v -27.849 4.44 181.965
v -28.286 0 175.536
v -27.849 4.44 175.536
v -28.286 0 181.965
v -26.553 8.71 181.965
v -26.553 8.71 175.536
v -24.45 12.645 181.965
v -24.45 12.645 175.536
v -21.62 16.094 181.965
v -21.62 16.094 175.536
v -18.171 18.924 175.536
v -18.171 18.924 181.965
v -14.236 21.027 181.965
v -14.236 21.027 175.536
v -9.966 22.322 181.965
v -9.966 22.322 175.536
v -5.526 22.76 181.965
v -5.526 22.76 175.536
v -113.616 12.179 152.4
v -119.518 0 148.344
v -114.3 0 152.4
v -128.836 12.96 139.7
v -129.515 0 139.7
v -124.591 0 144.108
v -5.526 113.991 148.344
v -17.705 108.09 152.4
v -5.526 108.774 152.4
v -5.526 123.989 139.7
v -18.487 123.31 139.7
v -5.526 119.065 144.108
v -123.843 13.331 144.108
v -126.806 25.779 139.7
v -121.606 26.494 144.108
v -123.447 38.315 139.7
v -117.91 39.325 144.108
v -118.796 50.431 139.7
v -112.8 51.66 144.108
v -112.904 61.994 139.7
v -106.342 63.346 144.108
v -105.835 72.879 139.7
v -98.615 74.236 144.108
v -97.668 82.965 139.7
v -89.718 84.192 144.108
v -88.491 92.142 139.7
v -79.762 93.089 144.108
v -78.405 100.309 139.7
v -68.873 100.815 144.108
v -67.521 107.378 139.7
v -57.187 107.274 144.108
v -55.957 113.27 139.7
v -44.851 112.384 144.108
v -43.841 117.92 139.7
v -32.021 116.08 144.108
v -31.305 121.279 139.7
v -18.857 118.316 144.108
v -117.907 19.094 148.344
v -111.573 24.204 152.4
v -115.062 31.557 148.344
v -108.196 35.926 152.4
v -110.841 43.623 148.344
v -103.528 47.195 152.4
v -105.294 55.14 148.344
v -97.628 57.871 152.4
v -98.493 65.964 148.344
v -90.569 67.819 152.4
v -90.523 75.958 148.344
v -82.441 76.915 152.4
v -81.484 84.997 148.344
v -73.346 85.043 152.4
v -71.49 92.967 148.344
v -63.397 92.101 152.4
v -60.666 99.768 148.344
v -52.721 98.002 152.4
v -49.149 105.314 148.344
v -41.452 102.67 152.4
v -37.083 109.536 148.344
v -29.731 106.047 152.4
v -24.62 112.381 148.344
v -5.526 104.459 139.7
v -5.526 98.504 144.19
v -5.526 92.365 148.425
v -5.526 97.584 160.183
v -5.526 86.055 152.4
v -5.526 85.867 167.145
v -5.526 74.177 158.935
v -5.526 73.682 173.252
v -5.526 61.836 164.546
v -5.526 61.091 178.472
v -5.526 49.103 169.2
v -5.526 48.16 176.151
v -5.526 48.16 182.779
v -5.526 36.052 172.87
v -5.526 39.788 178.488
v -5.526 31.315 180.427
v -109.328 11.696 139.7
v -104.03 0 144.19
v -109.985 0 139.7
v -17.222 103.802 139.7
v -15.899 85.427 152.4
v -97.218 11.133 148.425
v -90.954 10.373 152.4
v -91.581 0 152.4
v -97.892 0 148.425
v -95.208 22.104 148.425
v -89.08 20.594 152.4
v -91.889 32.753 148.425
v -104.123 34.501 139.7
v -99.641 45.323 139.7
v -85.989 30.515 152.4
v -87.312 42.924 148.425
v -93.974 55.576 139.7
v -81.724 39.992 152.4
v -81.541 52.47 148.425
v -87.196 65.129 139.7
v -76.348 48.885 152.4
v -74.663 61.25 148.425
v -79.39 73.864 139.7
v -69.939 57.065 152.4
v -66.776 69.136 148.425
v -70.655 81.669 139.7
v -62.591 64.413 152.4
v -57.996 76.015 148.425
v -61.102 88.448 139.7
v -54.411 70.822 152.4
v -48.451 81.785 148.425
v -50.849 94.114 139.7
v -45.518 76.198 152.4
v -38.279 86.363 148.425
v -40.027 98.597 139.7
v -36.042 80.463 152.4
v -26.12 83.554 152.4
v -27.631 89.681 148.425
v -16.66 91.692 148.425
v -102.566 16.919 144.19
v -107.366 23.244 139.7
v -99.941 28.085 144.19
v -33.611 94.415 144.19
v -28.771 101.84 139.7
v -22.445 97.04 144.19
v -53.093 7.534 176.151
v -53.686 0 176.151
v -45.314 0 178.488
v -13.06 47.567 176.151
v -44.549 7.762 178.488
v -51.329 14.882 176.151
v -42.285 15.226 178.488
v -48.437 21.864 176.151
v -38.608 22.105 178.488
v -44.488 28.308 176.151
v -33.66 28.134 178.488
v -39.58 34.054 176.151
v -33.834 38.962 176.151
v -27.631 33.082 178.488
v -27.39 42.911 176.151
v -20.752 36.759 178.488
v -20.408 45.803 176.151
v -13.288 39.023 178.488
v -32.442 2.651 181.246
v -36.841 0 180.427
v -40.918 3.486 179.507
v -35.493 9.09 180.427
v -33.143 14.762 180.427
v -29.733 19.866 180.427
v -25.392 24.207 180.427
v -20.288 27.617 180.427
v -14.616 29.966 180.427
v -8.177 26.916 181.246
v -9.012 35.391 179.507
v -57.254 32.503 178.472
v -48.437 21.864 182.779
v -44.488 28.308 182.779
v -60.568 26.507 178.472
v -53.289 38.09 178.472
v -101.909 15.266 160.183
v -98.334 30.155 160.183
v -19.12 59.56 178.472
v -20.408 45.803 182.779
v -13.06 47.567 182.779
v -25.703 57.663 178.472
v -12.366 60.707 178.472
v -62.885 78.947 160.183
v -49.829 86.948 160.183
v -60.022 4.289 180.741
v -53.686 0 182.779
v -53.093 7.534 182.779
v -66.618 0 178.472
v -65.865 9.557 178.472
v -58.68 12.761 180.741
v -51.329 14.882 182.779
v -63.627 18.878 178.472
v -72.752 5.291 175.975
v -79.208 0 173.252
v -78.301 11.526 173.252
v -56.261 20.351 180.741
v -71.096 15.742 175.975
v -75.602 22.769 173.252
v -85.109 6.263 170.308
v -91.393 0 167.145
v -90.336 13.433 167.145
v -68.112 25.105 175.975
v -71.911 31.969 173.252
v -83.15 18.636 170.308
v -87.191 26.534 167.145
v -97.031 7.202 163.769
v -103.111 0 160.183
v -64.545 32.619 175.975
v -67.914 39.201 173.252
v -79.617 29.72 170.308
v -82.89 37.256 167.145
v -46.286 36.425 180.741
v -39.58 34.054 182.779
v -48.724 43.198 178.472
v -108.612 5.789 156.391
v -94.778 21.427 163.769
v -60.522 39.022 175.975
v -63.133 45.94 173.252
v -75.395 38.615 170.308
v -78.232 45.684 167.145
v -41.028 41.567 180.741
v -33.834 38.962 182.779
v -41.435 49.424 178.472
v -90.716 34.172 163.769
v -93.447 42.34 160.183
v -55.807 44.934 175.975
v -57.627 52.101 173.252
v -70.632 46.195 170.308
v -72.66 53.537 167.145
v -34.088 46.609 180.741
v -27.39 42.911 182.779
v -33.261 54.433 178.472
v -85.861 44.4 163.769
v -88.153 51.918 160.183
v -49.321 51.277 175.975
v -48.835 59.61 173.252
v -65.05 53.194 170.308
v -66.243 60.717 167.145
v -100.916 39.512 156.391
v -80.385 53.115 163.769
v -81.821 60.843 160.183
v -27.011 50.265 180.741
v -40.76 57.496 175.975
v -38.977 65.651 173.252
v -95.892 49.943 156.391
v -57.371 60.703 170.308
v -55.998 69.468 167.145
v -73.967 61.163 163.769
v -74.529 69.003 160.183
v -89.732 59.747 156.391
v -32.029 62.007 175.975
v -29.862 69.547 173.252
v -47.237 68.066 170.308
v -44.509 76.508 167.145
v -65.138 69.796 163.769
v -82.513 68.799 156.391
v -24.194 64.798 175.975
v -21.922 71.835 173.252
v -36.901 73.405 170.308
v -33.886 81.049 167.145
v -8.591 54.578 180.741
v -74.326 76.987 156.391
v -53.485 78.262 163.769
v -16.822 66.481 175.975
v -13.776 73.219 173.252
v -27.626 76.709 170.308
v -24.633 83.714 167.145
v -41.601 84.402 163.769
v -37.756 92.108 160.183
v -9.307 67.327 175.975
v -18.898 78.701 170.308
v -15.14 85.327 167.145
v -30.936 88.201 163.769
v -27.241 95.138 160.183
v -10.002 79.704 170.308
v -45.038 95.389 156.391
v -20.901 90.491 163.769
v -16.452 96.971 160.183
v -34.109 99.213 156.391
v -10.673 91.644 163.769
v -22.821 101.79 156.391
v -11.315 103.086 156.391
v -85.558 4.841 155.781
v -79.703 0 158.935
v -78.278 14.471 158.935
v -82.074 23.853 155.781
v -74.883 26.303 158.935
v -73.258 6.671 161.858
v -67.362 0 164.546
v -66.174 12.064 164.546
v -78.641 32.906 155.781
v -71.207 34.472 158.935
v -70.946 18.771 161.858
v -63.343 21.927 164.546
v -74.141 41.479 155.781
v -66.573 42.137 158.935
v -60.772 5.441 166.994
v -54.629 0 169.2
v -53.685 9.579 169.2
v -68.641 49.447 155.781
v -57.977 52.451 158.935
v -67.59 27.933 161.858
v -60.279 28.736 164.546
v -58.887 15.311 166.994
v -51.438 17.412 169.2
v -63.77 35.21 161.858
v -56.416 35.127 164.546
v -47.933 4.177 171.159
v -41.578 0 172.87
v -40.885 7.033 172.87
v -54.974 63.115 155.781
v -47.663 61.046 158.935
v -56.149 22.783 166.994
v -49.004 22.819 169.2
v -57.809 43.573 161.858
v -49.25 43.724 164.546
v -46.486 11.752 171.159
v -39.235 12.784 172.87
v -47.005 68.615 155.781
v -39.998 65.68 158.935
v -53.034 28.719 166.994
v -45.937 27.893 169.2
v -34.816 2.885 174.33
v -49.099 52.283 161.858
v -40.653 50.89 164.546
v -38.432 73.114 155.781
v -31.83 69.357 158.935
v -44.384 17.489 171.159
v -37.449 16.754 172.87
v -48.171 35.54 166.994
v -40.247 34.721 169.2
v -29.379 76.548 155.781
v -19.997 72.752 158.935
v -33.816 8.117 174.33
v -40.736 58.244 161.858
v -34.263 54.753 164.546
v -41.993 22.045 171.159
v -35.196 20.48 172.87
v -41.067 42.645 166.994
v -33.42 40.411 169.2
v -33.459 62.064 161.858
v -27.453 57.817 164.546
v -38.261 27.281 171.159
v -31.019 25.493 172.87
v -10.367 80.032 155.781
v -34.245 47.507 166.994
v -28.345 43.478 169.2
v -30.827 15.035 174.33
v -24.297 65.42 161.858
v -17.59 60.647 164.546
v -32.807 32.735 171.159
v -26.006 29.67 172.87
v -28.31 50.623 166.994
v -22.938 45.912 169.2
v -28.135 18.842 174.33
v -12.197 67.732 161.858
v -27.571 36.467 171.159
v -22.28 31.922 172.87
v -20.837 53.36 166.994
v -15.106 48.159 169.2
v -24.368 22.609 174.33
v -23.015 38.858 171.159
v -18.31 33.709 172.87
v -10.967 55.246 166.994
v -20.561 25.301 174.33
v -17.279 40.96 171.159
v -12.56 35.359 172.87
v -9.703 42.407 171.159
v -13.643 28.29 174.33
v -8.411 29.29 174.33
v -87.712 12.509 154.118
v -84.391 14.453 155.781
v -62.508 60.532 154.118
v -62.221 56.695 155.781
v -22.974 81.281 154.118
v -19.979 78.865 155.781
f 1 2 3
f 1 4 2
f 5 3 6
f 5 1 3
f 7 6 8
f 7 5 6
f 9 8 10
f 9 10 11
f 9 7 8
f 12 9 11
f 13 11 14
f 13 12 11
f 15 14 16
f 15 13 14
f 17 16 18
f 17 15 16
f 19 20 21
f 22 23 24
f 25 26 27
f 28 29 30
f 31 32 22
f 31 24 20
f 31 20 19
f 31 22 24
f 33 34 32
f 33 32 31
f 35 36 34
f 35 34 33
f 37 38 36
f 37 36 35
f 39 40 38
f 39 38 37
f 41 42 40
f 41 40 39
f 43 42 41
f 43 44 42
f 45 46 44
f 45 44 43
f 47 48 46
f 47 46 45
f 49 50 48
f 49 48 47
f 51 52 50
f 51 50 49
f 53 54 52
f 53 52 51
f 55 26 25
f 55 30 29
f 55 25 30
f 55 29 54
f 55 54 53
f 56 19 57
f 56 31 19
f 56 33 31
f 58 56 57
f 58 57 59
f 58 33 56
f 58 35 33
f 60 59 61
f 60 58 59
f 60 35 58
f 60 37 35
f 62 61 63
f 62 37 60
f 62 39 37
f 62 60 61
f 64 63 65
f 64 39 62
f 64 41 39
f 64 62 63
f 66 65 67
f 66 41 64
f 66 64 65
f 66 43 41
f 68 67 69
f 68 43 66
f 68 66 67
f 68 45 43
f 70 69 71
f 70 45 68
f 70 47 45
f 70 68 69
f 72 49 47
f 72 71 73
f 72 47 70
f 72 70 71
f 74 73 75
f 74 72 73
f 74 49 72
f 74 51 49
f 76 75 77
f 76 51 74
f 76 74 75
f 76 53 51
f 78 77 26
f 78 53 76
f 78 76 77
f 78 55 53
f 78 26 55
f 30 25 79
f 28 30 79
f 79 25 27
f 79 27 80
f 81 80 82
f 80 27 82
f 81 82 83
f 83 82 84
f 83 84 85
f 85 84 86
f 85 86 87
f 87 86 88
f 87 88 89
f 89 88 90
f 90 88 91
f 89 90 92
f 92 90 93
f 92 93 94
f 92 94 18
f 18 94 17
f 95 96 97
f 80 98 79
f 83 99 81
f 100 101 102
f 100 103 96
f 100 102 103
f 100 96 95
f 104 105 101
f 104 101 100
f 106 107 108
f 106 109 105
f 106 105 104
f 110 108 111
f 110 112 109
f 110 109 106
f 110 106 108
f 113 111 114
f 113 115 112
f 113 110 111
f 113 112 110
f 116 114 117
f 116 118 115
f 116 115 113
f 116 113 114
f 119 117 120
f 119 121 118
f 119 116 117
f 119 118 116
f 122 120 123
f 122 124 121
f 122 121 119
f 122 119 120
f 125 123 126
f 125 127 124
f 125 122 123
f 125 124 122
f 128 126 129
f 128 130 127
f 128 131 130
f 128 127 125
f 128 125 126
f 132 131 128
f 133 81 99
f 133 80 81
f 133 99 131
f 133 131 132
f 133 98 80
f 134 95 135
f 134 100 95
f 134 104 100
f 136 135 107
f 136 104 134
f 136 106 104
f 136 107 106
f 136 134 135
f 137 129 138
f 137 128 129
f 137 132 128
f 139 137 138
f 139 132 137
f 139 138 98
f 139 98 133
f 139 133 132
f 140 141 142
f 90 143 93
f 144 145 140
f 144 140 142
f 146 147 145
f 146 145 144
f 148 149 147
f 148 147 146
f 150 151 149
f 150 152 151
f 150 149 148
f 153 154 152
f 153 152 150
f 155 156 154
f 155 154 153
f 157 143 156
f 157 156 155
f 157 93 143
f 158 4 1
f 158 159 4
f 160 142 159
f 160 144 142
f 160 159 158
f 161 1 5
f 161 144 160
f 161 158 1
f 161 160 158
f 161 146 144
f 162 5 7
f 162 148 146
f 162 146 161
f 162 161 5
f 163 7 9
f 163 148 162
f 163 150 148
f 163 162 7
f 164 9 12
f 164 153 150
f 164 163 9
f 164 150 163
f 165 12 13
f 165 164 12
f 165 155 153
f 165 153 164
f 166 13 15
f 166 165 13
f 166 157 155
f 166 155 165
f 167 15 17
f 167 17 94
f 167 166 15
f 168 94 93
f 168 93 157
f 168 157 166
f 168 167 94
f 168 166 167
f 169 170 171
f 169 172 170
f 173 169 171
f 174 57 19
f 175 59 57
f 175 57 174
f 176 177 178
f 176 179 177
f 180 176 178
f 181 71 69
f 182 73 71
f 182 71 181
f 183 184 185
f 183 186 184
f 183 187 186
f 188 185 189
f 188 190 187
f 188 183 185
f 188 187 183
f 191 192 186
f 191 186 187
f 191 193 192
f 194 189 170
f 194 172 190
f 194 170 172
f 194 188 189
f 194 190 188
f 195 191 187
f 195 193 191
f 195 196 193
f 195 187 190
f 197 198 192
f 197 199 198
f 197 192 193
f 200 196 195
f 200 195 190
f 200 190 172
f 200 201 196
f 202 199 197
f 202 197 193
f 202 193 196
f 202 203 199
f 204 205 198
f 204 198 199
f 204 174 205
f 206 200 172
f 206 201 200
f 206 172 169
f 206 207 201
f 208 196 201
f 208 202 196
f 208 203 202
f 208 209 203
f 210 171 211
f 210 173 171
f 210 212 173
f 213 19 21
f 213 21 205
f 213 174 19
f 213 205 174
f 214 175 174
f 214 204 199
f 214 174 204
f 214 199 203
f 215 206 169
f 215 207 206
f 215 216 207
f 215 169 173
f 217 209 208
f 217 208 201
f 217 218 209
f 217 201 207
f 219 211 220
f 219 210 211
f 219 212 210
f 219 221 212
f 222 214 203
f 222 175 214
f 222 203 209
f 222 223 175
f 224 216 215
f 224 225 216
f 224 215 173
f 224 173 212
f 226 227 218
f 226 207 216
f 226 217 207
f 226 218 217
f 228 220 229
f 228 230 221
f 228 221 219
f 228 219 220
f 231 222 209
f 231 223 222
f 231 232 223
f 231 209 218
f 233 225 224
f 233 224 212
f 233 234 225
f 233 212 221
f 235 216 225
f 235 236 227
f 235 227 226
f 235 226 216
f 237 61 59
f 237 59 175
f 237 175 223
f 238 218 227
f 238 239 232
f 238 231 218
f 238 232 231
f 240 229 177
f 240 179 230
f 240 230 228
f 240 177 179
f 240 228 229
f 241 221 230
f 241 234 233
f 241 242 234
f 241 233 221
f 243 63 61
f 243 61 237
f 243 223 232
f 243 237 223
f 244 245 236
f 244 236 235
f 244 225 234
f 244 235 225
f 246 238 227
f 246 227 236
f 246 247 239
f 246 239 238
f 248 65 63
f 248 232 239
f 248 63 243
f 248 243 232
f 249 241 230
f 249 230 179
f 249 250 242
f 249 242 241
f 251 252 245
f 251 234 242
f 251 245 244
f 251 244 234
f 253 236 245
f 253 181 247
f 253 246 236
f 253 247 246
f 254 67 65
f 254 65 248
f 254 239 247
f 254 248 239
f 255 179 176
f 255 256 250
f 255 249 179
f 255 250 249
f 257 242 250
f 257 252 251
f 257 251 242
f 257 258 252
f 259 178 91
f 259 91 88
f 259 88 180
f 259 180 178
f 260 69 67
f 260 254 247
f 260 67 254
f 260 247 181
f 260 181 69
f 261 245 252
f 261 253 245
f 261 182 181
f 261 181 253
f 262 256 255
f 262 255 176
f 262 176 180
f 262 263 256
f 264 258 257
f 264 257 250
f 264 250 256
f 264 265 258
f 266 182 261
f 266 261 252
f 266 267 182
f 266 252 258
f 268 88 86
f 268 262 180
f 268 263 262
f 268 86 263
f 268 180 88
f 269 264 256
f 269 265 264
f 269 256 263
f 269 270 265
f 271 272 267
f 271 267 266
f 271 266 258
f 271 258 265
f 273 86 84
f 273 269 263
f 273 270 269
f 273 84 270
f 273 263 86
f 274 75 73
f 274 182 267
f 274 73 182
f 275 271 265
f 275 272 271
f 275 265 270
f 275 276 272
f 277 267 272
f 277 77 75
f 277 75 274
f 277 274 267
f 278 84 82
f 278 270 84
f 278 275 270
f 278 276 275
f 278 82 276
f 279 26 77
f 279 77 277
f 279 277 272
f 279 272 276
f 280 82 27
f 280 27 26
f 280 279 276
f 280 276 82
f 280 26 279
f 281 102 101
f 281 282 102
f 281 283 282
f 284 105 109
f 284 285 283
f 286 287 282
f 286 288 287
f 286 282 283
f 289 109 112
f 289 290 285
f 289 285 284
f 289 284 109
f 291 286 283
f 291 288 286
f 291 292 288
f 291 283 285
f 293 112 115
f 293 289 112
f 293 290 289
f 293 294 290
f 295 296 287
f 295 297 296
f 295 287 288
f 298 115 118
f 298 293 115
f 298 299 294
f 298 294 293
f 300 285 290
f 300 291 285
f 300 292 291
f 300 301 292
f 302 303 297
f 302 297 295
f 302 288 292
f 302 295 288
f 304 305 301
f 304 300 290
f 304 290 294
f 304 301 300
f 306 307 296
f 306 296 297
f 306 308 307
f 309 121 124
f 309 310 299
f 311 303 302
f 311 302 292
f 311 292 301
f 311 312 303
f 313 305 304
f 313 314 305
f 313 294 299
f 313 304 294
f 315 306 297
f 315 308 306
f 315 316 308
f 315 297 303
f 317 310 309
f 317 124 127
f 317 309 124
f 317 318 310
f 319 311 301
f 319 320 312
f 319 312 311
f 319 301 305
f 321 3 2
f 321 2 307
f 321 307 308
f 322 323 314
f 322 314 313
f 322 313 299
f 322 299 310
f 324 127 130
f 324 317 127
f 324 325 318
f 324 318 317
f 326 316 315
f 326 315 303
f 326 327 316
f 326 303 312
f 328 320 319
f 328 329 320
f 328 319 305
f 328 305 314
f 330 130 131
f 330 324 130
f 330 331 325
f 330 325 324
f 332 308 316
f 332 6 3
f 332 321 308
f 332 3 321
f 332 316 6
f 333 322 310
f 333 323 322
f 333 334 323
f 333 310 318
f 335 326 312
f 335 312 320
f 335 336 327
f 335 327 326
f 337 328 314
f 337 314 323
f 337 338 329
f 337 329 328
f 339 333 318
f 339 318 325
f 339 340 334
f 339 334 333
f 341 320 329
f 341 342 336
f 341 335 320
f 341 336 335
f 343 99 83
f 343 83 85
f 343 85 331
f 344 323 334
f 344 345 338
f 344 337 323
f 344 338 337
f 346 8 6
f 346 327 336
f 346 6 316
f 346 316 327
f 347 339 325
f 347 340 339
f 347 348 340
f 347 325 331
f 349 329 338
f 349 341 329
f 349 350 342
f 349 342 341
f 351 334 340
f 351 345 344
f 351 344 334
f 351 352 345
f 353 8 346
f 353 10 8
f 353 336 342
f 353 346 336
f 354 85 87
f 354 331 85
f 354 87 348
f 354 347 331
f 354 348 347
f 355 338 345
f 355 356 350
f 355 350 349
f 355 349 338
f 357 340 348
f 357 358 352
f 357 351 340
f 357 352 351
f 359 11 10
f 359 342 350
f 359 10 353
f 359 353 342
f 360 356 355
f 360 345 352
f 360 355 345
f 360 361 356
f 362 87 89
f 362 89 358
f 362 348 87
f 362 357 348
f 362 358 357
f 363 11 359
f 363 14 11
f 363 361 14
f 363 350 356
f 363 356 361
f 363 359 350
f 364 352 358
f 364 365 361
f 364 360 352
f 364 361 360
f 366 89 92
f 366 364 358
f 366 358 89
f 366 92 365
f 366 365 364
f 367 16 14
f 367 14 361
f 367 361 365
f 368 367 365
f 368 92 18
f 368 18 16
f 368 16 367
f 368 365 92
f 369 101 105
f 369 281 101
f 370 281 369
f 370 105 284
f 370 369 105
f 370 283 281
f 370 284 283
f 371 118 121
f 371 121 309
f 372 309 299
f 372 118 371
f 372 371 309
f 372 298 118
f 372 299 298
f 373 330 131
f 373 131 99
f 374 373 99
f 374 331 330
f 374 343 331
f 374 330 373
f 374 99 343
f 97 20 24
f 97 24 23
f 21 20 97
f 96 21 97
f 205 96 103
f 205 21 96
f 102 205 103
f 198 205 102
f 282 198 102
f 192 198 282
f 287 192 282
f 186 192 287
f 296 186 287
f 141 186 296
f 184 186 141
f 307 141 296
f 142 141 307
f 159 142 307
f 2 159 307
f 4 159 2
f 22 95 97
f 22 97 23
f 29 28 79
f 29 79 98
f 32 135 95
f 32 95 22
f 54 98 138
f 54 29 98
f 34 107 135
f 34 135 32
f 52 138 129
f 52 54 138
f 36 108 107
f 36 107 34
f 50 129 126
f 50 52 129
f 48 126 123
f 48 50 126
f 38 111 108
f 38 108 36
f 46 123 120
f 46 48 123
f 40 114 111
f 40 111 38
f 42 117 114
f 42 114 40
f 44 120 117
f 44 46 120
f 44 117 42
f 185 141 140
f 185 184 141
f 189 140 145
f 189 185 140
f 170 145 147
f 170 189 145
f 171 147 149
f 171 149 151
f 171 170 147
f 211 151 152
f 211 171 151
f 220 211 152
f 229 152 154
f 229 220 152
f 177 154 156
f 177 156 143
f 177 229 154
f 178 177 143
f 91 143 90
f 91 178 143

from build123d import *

# Parameters (mm, degrees)
F1_ANGLE = 90


with BuildPart() as f1:
    # F0 (on Front) → F1 (revolve)
    with BuildSketch(Plane.XZ):
        with BuildLine():
            ThreePointArc((-109.985226, 139.7), (-100.982962, 146.33961), (-91.581002, 152.4))
            Line((-91.581002, 152.4), (-103.370511, 152.4))
            Line((-103.370511, 152.4), (-114.3, 152.4))
            ThreePointArc((-114.3, 152.4), (-122.072817, 146.247999), (-129.515096, 139.7))
            Line((-129.515096, 139.7), (-119.979717, 139.7))
            Line((-119.979717, 139.7), (-109.985226, 139.7))
        make_face()
        with BuildLine():
            Line((-114.3, 152.4), (-103.370511, 152.4))
            ThreePointArc((-103.370511, 152.4), (-79.42104, 166.143074), (-53.685891, 176.150639))
            Line((-53.685891, 176.150639), (-53.685891, 182.77876))
            ThreePointArc((-53.685891, 182.77876), (-85.355329, 170.307715), (-114.3, 152.4))
        make_face()
        with BuildLine():
            Line((-103.370511, 152.4), (-91.581002, 152.4))
            ThreePointArc((-91.581002, 152.4), (-61.039594, 166.994036), (-28.285891, 175.535604))
            Line((-28.285891, 175.535604), (-28.285891, 181.964642))
            ThreePointArc((-28.285891, 181.964642), (-41.088854, 179.507461), (-53.685891, 176.150639))
            ThreePointArc((-53.685891, 176.150639), (-79.42104, 166.143074), (-103.370511, 152.4))
        make_face()
    revolve(axis=Axis((-5.526184, 0, 171.786702), (0, 0, -1)), revolution_arc=F1_ANGLE)


solid = f1.part
